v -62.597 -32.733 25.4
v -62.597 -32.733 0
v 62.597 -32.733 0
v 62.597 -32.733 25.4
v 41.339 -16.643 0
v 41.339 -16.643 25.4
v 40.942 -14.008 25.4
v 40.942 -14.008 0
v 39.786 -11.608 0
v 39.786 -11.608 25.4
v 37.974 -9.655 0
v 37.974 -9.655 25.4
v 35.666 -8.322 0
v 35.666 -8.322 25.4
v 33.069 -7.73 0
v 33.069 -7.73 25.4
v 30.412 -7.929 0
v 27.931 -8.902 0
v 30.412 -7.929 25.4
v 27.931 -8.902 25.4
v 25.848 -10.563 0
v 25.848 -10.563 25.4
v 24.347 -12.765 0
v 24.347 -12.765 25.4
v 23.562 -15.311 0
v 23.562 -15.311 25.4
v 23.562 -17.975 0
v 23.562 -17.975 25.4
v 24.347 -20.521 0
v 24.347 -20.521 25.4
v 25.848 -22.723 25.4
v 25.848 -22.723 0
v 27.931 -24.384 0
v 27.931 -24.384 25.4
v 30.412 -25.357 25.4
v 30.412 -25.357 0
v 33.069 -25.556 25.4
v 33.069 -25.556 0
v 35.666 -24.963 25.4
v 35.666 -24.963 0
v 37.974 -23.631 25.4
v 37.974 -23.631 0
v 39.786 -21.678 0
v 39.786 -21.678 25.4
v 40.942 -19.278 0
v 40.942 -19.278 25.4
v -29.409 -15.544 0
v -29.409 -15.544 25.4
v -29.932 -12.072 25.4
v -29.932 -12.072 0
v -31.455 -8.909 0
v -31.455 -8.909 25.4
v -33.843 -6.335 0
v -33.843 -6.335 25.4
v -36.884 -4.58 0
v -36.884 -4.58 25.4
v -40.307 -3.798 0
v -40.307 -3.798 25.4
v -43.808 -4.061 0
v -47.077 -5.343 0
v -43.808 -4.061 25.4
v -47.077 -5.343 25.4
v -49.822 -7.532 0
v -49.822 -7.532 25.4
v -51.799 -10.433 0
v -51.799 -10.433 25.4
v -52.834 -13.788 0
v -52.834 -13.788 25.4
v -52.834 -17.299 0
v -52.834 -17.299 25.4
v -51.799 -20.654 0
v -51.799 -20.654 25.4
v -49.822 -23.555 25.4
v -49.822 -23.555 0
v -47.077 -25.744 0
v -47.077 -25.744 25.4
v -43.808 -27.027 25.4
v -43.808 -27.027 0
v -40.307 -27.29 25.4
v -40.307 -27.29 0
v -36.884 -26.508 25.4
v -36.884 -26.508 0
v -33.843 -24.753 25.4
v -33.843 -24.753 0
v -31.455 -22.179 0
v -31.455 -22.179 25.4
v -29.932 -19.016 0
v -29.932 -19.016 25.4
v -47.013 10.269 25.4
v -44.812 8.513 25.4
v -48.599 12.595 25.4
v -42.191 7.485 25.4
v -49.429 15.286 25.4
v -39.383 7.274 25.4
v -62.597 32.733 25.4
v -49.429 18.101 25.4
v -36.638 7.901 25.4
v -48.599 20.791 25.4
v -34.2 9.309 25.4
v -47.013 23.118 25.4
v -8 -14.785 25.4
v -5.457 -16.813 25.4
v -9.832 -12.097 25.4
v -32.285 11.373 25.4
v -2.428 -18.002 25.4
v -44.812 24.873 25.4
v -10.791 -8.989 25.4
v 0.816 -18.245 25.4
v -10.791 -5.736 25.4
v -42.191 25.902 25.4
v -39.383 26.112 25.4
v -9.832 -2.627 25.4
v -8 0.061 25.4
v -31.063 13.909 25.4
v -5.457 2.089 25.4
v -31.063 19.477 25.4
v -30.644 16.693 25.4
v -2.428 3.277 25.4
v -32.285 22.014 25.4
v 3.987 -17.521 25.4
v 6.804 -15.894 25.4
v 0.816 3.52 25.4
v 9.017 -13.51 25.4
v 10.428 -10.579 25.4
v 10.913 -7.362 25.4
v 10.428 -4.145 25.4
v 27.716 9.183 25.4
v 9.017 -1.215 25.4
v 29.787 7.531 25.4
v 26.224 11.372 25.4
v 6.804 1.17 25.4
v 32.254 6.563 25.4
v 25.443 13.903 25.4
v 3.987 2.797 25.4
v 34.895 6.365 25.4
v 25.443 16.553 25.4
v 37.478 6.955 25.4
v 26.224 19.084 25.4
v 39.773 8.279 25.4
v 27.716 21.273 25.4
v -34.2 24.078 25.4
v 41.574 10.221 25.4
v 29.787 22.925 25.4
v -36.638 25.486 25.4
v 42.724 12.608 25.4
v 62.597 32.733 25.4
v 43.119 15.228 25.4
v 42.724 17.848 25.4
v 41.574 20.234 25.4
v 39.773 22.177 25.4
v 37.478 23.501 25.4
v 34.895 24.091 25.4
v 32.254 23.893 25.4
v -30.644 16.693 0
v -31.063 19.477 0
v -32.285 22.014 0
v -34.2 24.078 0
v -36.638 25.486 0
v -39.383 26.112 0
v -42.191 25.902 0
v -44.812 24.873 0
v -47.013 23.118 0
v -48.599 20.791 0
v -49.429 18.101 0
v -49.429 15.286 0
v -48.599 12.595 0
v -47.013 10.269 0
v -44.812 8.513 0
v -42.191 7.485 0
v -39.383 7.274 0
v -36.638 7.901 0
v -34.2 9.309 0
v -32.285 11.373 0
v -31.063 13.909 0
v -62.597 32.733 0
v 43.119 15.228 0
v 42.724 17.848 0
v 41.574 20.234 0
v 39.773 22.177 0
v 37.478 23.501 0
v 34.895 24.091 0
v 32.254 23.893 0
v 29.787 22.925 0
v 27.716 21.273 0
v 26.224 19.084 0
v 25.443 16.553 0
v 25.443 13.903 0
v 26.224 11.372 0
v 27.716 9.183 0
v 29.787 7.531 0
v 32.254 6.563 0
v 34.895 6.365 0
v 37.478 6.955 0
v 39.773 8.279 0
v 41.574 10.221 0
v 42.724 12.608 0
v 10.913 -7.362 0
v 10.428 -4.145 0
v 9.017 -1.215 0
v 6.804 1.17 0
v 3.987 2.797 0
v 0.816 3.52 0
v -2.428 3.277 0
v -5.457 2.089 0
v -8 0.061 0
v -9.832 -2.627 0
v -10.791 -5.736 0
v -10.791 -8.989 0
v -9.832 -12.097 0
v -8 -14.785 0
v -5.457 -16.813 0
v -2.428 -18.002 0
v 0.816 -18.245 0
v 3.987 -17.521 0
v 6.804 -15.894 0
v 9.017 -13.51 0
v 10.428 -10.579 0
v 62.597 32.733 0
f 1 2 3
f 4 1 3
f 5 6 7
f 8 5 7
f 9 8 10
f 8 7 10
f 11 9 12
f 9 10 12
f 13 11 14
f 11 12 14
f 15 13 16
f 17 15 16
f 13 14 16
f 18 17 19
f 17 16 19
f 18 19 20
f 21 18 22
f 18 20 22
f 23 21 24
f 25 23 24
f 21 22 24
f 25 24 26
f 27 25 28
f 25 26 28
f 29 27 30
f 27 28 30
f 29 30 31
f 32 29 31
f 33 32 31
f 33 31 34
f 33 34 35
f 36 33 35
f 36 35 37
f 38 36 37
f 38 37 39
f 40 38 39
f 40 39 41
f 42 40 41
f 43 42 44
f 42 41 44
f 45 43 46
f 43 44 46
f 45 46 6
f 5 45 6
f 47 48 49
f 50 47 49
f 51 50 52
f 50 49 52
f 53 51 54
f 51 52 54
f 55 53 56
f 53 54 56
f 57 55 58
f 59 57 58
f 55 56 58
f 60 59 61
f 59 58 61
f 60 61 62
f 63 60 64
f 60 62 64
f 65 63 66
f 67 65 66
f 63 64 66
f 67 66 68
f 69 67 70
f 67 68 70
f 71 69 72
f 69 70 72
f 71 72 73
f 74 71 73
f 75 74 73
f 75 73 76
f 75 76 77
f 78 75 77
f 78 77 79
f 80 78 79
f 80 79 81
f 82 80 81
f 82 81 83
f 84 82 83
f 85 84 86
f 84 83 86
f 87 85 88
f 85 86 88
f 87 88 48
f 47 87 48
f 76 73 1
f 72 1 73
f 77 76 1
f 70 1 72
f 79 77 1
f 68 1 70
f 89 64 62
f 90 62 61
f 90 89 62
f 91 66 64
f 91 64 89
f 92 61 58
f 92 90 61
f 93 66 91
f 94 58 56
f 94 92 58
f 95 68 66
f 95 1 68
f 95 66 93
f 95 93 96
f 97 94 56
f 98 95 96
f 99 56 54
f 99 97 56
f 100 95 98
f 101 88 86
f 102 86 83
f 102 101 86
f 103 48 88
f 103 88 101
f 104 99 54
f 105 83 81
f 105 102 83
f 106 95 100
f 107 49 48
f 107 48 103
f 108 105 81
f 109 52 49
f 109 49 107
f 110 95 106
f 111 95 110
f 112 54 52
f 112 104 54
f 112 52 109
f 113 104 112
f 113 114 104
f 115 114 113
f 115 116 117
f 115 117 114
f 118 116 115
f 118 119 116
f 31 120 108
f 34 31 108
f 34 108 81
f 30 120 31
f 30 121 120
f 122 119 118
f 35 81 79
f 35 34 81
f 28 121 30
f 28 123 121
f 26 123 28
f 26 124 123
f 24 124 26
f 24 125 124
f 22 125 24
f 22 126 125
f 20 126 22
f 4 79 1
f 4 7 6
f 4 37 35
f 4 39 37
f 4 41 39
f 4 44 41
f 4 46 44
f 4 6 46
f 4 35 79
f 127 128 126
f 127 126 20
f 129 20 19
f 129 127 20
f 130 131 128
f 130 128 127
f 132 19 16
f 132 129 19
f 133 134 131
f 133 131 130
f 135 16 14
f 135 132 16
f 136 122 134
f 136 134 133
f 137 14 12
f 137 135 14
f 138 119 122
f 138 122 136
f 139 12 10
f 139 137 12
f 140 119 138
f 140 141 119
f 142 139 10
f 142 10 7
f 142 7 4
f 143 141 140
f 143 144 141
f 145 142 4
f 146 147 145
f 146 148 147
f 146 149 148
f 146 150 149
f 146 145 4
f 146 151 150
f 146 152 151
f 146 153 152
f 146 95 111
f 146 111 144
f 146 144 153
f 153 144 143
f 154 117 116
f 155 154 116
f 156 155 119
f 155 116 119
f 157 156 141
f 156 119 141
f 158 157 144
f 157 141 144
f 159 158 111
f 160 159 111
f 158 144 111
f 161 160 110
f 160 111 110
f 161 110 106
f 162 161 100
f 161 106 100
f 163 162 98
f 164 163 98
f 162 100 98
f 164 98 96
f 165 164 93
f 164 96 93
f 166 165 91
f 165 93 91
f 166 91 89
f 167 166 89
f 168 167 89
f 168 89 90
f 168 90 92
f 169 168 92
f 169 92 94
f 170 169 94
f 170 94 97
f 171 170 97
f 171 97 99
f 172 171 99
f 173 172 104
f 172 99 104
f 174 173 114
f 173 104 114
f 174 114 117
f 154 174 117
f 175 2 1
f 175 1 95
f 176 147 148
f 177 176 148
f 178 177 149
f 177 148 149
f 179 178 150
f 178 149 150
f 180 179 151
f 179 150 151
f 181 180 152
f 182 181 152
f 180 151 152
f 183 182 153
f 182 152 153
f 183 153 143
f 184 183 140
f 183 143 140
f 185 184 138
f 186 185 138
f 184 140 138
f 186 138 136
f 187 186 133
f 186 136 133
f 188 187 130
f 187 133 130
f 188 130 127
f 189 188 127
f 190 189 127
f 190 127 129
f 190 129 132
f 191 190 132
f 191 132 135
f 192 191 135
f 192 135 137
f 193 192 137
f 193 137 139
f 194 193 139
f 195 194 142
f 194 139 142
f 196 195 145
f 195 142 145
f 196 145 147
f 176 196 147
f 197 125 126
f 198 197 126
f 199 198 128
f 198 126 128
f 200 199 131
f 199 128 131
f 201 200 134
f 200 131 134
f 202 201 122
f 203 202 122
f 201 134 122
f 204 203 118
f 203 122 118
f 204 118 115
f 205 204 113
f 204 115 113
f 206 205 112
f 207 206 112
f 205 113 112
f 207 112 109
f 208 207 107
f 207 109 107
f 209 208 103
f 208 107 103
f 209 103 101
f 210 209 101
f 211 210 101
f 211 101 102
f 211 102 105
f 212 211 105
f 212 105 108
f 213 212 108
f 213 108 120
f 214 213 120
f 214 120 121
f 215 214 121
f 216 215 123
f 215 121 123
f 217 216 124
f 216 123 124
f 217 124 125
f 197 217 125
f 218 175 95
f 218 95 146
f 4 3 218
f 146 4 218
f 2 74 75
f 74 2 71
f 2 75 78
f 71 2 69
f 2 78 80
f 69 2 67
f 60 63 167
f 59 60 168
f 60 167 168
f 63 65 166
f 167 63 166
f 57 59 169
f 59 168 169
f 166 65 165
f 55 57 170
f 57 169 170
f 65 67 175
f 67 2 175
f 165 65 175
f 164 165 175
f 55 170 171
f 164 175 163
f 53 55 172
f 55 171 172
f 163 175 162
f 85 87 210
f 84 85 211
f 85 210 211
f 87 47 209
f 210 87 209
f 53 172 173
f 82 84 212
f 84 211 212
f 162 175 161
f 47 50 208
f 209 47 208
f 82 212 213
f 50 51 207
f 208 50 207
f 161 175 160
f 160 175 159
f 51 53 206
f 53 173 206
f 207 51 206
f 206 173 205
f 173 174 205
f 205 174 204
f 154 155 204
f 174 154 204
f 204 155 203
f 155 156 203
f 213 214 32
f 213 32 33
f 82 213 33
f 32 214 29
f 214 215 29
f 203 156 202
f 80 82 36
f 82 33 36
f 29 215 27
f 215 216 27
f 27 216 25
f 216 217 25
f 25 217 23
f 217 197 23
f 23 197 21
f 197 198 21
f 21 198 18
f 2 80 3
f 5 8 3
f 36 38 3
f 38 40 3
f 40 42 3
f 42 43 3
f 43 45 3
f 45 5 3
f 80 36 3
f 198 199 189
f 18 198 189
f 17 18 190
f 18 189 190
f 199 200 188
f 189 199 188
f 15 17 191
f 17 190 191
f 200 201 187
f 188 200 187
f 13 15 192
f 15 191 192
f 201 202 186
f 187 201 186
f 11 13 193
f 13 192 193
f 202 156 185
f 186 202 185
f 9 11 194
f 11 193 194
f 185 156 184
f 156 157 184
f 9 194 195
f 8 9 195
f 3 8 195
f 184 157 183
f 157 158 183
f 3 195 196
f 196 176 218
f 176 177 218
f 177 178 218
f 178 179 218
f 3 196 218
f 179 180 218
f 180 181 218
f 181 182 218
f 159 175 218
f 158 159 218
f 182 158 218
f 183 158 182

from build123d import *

# Parameters (mm, degrees)
F0_W          = 125.194638
F0_H          = 65.465718
F1_DEPTH      = 25.4
F2_R          = 8.887572
F2_R_2        = 9.445227
F2_R_3        = 8.938329
F2_R_4        = 11.778548
F3_DEPTH      = 25.4
F4_R          = 10.913086
F5_DEPTH      = 25.4
F5_DEPTH_BACK = 25.4


with BuildPart() as f1:
    # F0 (on Top) → F1 (new body)
    with BuildSketch(Plane.XY):
        Rectangle(F0_W, F0_H)
    extrude(amount=F1_DEPTH)

    # F2 (on face) → F3 (cut)
    with BuildSketch(Plane.XY.offset(25.4)):
        with Locations((34.231201, 15.227929)):
            Circle(F2_R)
        with Locations((-40.088922, 16.693249)):
            Circle(F2_R_2)
        with Locations((32.400653, -16.642913)):
            Circle(F2_R_3)
        with Locations((-41.187249, -15.543923)):
            Circle(F2_R_4)
    extrude(amount=-F3_DEPTH, mode=Mode.SUBTRACT)

    # F4 (on face) → F5 (cut, two sides)
    with BuildSketch(Plane.XY.offset(25.4)) as f5_sk:
        with Locations((0, -7.362174)):
            Circle(F4_R)
    extrude(amount=-F5_DEPTH, mode=Mode.SUBTRACT)
    extrude(f5_sk.sketch, amount=-F5_DEPTH_BACK, mode=Mode.SUBTRACT)


solid = f1.part
